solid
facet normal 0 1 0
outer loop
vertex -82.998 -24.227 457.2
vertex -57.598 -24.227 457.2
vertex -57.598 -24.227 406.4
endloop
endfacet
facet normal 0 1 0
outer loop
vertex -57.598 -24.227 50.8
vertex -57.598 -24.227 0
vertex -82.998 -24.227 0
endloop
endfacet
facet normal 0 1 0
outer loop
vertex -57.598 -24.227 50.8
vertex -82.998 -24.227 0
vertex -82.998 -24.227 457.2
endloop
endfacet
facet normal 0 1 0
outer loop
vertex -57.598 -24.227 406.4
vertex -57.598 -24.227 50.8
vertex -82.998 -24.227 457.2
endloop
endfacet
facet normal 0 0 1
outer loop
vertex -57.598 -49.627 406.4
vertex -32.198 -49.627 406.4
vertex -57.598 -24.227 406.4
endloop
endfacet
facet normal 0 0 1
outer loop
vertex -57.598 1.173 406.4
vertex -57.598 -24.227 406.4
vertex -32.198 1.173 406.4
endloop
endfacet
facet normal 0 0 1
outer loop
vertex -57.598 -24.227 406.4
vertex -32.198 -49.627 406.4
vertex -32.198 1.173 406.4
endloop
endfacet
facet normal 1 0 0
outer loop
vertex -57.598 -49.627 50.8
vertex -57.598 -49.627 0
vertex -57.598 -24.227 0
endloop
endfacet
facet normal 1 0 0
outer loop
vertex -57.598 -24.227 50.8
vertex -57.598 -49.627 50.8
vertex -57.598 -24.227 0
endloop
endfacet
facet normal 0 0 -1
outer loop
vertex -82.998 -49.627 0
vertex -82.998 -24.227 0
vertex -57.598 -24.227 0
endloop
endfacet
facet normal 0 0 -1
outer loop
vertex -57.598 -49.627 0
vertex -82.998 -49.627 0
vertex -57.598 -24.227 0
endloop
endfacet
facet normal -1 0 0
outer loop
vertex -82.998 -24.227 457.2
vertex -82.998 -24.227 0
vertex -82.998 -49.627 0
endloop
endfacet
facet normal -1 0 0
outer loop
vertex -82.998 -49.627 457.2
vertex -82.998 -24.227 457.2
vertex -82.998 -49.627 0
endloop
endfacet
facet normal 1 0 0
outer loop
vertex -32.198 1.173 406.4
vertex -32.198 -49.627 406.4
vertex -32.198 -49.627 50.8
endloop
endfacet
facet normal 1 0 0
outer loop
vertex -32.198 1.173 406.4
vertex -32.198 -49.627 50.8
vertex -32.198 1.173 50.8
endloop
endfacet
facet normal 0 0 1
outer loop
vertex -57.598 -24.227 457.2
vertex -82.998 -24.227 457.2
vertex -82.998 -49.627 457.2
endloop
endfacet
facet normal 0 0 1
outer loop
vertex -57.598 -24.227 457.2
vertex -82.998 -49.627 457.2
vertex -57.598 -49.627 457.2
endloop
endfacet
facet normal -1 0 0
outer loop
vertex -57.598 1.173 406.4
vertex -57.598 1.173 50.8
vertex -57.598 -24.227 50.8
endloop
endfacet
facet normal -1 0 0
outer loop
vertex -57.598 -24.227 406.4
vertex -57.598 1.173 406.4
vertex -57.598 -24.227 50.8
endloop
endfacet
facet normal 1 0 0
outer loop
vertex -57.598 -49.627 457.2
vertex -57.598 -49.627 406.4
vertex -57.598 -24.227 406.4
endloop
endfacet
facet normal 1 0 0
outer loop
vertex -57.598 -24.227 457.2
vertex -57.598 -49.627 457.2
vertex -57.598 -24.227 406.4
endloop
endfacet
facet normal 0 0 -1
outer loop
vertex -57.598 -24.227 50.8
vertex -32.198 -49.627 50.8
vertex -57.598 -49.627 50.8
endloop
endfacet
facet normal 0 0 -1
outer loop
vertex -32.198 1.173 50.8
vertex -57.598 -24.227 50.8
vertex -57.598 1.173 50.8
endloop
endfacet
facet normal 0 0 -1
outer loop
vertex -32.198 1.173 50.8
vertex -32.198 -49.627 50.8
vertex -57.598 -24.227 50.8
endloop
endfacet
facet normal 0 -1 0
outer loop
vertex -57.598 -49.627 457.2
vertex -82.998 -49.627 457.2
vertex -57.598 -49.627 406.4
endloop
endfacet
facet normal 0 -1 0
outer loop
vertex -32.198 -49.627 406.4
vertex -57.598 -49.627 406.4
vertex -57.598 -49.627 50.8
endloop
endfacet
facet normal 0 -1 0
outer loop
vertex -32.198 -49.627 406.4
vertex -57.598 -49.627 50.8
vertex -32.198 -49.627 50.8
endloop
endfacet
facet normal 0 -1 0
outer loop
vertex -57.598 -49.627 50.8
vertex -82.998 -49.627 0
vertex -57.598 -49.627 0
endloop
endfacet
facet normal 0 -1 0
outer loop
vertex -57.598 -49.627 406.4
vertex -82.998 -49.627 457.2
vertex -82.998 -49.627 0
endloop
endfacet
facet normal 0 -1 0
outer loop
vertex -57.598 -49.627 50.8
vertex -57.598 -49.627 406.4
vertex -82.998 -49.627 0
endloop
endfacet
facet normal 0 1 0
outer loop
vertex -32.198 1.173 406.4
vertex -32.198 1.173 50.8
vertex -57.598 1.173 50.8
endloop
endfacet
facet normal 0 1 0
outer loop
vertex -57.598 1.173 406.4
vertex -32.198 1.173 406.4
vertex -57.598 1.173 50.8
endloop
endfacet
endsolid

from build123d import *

# Parameters (mm, degrees)
F1_DEPTH = 457.2
F2_W     = 50.8
F2_H     = 50.8
F3_DEPTH = 25.4


with BuildPart() as f1:
    # F0 (on Top) → F1 (new body)
    with BuildSketch(Plane.XY):
        Polygon((-82.997608, -24.226959), (-82.997608, -49.626959), (-32.197608, -49.626959), (-32.197608, 1.173041), (-57.597608, 1.173041), (-57.597608, -24.226959), align=None)
    extrude(amount=F1_DEPTH)

    # F2 (on face) → F3 (cut)
    with BuildSketch(Plane.YZ.offset(-32.197608)):
        with Locations((-24.226959, 431.8)):
            Rectangle(F2_W, F2_H)
        with Locations((-24.226959, 25.4)):
            Rectangle(F2_W, F2_H)
    extrude(amount=-F3_DEPTH, mode=Mode.SUBTRACT)


solid = f1.part
